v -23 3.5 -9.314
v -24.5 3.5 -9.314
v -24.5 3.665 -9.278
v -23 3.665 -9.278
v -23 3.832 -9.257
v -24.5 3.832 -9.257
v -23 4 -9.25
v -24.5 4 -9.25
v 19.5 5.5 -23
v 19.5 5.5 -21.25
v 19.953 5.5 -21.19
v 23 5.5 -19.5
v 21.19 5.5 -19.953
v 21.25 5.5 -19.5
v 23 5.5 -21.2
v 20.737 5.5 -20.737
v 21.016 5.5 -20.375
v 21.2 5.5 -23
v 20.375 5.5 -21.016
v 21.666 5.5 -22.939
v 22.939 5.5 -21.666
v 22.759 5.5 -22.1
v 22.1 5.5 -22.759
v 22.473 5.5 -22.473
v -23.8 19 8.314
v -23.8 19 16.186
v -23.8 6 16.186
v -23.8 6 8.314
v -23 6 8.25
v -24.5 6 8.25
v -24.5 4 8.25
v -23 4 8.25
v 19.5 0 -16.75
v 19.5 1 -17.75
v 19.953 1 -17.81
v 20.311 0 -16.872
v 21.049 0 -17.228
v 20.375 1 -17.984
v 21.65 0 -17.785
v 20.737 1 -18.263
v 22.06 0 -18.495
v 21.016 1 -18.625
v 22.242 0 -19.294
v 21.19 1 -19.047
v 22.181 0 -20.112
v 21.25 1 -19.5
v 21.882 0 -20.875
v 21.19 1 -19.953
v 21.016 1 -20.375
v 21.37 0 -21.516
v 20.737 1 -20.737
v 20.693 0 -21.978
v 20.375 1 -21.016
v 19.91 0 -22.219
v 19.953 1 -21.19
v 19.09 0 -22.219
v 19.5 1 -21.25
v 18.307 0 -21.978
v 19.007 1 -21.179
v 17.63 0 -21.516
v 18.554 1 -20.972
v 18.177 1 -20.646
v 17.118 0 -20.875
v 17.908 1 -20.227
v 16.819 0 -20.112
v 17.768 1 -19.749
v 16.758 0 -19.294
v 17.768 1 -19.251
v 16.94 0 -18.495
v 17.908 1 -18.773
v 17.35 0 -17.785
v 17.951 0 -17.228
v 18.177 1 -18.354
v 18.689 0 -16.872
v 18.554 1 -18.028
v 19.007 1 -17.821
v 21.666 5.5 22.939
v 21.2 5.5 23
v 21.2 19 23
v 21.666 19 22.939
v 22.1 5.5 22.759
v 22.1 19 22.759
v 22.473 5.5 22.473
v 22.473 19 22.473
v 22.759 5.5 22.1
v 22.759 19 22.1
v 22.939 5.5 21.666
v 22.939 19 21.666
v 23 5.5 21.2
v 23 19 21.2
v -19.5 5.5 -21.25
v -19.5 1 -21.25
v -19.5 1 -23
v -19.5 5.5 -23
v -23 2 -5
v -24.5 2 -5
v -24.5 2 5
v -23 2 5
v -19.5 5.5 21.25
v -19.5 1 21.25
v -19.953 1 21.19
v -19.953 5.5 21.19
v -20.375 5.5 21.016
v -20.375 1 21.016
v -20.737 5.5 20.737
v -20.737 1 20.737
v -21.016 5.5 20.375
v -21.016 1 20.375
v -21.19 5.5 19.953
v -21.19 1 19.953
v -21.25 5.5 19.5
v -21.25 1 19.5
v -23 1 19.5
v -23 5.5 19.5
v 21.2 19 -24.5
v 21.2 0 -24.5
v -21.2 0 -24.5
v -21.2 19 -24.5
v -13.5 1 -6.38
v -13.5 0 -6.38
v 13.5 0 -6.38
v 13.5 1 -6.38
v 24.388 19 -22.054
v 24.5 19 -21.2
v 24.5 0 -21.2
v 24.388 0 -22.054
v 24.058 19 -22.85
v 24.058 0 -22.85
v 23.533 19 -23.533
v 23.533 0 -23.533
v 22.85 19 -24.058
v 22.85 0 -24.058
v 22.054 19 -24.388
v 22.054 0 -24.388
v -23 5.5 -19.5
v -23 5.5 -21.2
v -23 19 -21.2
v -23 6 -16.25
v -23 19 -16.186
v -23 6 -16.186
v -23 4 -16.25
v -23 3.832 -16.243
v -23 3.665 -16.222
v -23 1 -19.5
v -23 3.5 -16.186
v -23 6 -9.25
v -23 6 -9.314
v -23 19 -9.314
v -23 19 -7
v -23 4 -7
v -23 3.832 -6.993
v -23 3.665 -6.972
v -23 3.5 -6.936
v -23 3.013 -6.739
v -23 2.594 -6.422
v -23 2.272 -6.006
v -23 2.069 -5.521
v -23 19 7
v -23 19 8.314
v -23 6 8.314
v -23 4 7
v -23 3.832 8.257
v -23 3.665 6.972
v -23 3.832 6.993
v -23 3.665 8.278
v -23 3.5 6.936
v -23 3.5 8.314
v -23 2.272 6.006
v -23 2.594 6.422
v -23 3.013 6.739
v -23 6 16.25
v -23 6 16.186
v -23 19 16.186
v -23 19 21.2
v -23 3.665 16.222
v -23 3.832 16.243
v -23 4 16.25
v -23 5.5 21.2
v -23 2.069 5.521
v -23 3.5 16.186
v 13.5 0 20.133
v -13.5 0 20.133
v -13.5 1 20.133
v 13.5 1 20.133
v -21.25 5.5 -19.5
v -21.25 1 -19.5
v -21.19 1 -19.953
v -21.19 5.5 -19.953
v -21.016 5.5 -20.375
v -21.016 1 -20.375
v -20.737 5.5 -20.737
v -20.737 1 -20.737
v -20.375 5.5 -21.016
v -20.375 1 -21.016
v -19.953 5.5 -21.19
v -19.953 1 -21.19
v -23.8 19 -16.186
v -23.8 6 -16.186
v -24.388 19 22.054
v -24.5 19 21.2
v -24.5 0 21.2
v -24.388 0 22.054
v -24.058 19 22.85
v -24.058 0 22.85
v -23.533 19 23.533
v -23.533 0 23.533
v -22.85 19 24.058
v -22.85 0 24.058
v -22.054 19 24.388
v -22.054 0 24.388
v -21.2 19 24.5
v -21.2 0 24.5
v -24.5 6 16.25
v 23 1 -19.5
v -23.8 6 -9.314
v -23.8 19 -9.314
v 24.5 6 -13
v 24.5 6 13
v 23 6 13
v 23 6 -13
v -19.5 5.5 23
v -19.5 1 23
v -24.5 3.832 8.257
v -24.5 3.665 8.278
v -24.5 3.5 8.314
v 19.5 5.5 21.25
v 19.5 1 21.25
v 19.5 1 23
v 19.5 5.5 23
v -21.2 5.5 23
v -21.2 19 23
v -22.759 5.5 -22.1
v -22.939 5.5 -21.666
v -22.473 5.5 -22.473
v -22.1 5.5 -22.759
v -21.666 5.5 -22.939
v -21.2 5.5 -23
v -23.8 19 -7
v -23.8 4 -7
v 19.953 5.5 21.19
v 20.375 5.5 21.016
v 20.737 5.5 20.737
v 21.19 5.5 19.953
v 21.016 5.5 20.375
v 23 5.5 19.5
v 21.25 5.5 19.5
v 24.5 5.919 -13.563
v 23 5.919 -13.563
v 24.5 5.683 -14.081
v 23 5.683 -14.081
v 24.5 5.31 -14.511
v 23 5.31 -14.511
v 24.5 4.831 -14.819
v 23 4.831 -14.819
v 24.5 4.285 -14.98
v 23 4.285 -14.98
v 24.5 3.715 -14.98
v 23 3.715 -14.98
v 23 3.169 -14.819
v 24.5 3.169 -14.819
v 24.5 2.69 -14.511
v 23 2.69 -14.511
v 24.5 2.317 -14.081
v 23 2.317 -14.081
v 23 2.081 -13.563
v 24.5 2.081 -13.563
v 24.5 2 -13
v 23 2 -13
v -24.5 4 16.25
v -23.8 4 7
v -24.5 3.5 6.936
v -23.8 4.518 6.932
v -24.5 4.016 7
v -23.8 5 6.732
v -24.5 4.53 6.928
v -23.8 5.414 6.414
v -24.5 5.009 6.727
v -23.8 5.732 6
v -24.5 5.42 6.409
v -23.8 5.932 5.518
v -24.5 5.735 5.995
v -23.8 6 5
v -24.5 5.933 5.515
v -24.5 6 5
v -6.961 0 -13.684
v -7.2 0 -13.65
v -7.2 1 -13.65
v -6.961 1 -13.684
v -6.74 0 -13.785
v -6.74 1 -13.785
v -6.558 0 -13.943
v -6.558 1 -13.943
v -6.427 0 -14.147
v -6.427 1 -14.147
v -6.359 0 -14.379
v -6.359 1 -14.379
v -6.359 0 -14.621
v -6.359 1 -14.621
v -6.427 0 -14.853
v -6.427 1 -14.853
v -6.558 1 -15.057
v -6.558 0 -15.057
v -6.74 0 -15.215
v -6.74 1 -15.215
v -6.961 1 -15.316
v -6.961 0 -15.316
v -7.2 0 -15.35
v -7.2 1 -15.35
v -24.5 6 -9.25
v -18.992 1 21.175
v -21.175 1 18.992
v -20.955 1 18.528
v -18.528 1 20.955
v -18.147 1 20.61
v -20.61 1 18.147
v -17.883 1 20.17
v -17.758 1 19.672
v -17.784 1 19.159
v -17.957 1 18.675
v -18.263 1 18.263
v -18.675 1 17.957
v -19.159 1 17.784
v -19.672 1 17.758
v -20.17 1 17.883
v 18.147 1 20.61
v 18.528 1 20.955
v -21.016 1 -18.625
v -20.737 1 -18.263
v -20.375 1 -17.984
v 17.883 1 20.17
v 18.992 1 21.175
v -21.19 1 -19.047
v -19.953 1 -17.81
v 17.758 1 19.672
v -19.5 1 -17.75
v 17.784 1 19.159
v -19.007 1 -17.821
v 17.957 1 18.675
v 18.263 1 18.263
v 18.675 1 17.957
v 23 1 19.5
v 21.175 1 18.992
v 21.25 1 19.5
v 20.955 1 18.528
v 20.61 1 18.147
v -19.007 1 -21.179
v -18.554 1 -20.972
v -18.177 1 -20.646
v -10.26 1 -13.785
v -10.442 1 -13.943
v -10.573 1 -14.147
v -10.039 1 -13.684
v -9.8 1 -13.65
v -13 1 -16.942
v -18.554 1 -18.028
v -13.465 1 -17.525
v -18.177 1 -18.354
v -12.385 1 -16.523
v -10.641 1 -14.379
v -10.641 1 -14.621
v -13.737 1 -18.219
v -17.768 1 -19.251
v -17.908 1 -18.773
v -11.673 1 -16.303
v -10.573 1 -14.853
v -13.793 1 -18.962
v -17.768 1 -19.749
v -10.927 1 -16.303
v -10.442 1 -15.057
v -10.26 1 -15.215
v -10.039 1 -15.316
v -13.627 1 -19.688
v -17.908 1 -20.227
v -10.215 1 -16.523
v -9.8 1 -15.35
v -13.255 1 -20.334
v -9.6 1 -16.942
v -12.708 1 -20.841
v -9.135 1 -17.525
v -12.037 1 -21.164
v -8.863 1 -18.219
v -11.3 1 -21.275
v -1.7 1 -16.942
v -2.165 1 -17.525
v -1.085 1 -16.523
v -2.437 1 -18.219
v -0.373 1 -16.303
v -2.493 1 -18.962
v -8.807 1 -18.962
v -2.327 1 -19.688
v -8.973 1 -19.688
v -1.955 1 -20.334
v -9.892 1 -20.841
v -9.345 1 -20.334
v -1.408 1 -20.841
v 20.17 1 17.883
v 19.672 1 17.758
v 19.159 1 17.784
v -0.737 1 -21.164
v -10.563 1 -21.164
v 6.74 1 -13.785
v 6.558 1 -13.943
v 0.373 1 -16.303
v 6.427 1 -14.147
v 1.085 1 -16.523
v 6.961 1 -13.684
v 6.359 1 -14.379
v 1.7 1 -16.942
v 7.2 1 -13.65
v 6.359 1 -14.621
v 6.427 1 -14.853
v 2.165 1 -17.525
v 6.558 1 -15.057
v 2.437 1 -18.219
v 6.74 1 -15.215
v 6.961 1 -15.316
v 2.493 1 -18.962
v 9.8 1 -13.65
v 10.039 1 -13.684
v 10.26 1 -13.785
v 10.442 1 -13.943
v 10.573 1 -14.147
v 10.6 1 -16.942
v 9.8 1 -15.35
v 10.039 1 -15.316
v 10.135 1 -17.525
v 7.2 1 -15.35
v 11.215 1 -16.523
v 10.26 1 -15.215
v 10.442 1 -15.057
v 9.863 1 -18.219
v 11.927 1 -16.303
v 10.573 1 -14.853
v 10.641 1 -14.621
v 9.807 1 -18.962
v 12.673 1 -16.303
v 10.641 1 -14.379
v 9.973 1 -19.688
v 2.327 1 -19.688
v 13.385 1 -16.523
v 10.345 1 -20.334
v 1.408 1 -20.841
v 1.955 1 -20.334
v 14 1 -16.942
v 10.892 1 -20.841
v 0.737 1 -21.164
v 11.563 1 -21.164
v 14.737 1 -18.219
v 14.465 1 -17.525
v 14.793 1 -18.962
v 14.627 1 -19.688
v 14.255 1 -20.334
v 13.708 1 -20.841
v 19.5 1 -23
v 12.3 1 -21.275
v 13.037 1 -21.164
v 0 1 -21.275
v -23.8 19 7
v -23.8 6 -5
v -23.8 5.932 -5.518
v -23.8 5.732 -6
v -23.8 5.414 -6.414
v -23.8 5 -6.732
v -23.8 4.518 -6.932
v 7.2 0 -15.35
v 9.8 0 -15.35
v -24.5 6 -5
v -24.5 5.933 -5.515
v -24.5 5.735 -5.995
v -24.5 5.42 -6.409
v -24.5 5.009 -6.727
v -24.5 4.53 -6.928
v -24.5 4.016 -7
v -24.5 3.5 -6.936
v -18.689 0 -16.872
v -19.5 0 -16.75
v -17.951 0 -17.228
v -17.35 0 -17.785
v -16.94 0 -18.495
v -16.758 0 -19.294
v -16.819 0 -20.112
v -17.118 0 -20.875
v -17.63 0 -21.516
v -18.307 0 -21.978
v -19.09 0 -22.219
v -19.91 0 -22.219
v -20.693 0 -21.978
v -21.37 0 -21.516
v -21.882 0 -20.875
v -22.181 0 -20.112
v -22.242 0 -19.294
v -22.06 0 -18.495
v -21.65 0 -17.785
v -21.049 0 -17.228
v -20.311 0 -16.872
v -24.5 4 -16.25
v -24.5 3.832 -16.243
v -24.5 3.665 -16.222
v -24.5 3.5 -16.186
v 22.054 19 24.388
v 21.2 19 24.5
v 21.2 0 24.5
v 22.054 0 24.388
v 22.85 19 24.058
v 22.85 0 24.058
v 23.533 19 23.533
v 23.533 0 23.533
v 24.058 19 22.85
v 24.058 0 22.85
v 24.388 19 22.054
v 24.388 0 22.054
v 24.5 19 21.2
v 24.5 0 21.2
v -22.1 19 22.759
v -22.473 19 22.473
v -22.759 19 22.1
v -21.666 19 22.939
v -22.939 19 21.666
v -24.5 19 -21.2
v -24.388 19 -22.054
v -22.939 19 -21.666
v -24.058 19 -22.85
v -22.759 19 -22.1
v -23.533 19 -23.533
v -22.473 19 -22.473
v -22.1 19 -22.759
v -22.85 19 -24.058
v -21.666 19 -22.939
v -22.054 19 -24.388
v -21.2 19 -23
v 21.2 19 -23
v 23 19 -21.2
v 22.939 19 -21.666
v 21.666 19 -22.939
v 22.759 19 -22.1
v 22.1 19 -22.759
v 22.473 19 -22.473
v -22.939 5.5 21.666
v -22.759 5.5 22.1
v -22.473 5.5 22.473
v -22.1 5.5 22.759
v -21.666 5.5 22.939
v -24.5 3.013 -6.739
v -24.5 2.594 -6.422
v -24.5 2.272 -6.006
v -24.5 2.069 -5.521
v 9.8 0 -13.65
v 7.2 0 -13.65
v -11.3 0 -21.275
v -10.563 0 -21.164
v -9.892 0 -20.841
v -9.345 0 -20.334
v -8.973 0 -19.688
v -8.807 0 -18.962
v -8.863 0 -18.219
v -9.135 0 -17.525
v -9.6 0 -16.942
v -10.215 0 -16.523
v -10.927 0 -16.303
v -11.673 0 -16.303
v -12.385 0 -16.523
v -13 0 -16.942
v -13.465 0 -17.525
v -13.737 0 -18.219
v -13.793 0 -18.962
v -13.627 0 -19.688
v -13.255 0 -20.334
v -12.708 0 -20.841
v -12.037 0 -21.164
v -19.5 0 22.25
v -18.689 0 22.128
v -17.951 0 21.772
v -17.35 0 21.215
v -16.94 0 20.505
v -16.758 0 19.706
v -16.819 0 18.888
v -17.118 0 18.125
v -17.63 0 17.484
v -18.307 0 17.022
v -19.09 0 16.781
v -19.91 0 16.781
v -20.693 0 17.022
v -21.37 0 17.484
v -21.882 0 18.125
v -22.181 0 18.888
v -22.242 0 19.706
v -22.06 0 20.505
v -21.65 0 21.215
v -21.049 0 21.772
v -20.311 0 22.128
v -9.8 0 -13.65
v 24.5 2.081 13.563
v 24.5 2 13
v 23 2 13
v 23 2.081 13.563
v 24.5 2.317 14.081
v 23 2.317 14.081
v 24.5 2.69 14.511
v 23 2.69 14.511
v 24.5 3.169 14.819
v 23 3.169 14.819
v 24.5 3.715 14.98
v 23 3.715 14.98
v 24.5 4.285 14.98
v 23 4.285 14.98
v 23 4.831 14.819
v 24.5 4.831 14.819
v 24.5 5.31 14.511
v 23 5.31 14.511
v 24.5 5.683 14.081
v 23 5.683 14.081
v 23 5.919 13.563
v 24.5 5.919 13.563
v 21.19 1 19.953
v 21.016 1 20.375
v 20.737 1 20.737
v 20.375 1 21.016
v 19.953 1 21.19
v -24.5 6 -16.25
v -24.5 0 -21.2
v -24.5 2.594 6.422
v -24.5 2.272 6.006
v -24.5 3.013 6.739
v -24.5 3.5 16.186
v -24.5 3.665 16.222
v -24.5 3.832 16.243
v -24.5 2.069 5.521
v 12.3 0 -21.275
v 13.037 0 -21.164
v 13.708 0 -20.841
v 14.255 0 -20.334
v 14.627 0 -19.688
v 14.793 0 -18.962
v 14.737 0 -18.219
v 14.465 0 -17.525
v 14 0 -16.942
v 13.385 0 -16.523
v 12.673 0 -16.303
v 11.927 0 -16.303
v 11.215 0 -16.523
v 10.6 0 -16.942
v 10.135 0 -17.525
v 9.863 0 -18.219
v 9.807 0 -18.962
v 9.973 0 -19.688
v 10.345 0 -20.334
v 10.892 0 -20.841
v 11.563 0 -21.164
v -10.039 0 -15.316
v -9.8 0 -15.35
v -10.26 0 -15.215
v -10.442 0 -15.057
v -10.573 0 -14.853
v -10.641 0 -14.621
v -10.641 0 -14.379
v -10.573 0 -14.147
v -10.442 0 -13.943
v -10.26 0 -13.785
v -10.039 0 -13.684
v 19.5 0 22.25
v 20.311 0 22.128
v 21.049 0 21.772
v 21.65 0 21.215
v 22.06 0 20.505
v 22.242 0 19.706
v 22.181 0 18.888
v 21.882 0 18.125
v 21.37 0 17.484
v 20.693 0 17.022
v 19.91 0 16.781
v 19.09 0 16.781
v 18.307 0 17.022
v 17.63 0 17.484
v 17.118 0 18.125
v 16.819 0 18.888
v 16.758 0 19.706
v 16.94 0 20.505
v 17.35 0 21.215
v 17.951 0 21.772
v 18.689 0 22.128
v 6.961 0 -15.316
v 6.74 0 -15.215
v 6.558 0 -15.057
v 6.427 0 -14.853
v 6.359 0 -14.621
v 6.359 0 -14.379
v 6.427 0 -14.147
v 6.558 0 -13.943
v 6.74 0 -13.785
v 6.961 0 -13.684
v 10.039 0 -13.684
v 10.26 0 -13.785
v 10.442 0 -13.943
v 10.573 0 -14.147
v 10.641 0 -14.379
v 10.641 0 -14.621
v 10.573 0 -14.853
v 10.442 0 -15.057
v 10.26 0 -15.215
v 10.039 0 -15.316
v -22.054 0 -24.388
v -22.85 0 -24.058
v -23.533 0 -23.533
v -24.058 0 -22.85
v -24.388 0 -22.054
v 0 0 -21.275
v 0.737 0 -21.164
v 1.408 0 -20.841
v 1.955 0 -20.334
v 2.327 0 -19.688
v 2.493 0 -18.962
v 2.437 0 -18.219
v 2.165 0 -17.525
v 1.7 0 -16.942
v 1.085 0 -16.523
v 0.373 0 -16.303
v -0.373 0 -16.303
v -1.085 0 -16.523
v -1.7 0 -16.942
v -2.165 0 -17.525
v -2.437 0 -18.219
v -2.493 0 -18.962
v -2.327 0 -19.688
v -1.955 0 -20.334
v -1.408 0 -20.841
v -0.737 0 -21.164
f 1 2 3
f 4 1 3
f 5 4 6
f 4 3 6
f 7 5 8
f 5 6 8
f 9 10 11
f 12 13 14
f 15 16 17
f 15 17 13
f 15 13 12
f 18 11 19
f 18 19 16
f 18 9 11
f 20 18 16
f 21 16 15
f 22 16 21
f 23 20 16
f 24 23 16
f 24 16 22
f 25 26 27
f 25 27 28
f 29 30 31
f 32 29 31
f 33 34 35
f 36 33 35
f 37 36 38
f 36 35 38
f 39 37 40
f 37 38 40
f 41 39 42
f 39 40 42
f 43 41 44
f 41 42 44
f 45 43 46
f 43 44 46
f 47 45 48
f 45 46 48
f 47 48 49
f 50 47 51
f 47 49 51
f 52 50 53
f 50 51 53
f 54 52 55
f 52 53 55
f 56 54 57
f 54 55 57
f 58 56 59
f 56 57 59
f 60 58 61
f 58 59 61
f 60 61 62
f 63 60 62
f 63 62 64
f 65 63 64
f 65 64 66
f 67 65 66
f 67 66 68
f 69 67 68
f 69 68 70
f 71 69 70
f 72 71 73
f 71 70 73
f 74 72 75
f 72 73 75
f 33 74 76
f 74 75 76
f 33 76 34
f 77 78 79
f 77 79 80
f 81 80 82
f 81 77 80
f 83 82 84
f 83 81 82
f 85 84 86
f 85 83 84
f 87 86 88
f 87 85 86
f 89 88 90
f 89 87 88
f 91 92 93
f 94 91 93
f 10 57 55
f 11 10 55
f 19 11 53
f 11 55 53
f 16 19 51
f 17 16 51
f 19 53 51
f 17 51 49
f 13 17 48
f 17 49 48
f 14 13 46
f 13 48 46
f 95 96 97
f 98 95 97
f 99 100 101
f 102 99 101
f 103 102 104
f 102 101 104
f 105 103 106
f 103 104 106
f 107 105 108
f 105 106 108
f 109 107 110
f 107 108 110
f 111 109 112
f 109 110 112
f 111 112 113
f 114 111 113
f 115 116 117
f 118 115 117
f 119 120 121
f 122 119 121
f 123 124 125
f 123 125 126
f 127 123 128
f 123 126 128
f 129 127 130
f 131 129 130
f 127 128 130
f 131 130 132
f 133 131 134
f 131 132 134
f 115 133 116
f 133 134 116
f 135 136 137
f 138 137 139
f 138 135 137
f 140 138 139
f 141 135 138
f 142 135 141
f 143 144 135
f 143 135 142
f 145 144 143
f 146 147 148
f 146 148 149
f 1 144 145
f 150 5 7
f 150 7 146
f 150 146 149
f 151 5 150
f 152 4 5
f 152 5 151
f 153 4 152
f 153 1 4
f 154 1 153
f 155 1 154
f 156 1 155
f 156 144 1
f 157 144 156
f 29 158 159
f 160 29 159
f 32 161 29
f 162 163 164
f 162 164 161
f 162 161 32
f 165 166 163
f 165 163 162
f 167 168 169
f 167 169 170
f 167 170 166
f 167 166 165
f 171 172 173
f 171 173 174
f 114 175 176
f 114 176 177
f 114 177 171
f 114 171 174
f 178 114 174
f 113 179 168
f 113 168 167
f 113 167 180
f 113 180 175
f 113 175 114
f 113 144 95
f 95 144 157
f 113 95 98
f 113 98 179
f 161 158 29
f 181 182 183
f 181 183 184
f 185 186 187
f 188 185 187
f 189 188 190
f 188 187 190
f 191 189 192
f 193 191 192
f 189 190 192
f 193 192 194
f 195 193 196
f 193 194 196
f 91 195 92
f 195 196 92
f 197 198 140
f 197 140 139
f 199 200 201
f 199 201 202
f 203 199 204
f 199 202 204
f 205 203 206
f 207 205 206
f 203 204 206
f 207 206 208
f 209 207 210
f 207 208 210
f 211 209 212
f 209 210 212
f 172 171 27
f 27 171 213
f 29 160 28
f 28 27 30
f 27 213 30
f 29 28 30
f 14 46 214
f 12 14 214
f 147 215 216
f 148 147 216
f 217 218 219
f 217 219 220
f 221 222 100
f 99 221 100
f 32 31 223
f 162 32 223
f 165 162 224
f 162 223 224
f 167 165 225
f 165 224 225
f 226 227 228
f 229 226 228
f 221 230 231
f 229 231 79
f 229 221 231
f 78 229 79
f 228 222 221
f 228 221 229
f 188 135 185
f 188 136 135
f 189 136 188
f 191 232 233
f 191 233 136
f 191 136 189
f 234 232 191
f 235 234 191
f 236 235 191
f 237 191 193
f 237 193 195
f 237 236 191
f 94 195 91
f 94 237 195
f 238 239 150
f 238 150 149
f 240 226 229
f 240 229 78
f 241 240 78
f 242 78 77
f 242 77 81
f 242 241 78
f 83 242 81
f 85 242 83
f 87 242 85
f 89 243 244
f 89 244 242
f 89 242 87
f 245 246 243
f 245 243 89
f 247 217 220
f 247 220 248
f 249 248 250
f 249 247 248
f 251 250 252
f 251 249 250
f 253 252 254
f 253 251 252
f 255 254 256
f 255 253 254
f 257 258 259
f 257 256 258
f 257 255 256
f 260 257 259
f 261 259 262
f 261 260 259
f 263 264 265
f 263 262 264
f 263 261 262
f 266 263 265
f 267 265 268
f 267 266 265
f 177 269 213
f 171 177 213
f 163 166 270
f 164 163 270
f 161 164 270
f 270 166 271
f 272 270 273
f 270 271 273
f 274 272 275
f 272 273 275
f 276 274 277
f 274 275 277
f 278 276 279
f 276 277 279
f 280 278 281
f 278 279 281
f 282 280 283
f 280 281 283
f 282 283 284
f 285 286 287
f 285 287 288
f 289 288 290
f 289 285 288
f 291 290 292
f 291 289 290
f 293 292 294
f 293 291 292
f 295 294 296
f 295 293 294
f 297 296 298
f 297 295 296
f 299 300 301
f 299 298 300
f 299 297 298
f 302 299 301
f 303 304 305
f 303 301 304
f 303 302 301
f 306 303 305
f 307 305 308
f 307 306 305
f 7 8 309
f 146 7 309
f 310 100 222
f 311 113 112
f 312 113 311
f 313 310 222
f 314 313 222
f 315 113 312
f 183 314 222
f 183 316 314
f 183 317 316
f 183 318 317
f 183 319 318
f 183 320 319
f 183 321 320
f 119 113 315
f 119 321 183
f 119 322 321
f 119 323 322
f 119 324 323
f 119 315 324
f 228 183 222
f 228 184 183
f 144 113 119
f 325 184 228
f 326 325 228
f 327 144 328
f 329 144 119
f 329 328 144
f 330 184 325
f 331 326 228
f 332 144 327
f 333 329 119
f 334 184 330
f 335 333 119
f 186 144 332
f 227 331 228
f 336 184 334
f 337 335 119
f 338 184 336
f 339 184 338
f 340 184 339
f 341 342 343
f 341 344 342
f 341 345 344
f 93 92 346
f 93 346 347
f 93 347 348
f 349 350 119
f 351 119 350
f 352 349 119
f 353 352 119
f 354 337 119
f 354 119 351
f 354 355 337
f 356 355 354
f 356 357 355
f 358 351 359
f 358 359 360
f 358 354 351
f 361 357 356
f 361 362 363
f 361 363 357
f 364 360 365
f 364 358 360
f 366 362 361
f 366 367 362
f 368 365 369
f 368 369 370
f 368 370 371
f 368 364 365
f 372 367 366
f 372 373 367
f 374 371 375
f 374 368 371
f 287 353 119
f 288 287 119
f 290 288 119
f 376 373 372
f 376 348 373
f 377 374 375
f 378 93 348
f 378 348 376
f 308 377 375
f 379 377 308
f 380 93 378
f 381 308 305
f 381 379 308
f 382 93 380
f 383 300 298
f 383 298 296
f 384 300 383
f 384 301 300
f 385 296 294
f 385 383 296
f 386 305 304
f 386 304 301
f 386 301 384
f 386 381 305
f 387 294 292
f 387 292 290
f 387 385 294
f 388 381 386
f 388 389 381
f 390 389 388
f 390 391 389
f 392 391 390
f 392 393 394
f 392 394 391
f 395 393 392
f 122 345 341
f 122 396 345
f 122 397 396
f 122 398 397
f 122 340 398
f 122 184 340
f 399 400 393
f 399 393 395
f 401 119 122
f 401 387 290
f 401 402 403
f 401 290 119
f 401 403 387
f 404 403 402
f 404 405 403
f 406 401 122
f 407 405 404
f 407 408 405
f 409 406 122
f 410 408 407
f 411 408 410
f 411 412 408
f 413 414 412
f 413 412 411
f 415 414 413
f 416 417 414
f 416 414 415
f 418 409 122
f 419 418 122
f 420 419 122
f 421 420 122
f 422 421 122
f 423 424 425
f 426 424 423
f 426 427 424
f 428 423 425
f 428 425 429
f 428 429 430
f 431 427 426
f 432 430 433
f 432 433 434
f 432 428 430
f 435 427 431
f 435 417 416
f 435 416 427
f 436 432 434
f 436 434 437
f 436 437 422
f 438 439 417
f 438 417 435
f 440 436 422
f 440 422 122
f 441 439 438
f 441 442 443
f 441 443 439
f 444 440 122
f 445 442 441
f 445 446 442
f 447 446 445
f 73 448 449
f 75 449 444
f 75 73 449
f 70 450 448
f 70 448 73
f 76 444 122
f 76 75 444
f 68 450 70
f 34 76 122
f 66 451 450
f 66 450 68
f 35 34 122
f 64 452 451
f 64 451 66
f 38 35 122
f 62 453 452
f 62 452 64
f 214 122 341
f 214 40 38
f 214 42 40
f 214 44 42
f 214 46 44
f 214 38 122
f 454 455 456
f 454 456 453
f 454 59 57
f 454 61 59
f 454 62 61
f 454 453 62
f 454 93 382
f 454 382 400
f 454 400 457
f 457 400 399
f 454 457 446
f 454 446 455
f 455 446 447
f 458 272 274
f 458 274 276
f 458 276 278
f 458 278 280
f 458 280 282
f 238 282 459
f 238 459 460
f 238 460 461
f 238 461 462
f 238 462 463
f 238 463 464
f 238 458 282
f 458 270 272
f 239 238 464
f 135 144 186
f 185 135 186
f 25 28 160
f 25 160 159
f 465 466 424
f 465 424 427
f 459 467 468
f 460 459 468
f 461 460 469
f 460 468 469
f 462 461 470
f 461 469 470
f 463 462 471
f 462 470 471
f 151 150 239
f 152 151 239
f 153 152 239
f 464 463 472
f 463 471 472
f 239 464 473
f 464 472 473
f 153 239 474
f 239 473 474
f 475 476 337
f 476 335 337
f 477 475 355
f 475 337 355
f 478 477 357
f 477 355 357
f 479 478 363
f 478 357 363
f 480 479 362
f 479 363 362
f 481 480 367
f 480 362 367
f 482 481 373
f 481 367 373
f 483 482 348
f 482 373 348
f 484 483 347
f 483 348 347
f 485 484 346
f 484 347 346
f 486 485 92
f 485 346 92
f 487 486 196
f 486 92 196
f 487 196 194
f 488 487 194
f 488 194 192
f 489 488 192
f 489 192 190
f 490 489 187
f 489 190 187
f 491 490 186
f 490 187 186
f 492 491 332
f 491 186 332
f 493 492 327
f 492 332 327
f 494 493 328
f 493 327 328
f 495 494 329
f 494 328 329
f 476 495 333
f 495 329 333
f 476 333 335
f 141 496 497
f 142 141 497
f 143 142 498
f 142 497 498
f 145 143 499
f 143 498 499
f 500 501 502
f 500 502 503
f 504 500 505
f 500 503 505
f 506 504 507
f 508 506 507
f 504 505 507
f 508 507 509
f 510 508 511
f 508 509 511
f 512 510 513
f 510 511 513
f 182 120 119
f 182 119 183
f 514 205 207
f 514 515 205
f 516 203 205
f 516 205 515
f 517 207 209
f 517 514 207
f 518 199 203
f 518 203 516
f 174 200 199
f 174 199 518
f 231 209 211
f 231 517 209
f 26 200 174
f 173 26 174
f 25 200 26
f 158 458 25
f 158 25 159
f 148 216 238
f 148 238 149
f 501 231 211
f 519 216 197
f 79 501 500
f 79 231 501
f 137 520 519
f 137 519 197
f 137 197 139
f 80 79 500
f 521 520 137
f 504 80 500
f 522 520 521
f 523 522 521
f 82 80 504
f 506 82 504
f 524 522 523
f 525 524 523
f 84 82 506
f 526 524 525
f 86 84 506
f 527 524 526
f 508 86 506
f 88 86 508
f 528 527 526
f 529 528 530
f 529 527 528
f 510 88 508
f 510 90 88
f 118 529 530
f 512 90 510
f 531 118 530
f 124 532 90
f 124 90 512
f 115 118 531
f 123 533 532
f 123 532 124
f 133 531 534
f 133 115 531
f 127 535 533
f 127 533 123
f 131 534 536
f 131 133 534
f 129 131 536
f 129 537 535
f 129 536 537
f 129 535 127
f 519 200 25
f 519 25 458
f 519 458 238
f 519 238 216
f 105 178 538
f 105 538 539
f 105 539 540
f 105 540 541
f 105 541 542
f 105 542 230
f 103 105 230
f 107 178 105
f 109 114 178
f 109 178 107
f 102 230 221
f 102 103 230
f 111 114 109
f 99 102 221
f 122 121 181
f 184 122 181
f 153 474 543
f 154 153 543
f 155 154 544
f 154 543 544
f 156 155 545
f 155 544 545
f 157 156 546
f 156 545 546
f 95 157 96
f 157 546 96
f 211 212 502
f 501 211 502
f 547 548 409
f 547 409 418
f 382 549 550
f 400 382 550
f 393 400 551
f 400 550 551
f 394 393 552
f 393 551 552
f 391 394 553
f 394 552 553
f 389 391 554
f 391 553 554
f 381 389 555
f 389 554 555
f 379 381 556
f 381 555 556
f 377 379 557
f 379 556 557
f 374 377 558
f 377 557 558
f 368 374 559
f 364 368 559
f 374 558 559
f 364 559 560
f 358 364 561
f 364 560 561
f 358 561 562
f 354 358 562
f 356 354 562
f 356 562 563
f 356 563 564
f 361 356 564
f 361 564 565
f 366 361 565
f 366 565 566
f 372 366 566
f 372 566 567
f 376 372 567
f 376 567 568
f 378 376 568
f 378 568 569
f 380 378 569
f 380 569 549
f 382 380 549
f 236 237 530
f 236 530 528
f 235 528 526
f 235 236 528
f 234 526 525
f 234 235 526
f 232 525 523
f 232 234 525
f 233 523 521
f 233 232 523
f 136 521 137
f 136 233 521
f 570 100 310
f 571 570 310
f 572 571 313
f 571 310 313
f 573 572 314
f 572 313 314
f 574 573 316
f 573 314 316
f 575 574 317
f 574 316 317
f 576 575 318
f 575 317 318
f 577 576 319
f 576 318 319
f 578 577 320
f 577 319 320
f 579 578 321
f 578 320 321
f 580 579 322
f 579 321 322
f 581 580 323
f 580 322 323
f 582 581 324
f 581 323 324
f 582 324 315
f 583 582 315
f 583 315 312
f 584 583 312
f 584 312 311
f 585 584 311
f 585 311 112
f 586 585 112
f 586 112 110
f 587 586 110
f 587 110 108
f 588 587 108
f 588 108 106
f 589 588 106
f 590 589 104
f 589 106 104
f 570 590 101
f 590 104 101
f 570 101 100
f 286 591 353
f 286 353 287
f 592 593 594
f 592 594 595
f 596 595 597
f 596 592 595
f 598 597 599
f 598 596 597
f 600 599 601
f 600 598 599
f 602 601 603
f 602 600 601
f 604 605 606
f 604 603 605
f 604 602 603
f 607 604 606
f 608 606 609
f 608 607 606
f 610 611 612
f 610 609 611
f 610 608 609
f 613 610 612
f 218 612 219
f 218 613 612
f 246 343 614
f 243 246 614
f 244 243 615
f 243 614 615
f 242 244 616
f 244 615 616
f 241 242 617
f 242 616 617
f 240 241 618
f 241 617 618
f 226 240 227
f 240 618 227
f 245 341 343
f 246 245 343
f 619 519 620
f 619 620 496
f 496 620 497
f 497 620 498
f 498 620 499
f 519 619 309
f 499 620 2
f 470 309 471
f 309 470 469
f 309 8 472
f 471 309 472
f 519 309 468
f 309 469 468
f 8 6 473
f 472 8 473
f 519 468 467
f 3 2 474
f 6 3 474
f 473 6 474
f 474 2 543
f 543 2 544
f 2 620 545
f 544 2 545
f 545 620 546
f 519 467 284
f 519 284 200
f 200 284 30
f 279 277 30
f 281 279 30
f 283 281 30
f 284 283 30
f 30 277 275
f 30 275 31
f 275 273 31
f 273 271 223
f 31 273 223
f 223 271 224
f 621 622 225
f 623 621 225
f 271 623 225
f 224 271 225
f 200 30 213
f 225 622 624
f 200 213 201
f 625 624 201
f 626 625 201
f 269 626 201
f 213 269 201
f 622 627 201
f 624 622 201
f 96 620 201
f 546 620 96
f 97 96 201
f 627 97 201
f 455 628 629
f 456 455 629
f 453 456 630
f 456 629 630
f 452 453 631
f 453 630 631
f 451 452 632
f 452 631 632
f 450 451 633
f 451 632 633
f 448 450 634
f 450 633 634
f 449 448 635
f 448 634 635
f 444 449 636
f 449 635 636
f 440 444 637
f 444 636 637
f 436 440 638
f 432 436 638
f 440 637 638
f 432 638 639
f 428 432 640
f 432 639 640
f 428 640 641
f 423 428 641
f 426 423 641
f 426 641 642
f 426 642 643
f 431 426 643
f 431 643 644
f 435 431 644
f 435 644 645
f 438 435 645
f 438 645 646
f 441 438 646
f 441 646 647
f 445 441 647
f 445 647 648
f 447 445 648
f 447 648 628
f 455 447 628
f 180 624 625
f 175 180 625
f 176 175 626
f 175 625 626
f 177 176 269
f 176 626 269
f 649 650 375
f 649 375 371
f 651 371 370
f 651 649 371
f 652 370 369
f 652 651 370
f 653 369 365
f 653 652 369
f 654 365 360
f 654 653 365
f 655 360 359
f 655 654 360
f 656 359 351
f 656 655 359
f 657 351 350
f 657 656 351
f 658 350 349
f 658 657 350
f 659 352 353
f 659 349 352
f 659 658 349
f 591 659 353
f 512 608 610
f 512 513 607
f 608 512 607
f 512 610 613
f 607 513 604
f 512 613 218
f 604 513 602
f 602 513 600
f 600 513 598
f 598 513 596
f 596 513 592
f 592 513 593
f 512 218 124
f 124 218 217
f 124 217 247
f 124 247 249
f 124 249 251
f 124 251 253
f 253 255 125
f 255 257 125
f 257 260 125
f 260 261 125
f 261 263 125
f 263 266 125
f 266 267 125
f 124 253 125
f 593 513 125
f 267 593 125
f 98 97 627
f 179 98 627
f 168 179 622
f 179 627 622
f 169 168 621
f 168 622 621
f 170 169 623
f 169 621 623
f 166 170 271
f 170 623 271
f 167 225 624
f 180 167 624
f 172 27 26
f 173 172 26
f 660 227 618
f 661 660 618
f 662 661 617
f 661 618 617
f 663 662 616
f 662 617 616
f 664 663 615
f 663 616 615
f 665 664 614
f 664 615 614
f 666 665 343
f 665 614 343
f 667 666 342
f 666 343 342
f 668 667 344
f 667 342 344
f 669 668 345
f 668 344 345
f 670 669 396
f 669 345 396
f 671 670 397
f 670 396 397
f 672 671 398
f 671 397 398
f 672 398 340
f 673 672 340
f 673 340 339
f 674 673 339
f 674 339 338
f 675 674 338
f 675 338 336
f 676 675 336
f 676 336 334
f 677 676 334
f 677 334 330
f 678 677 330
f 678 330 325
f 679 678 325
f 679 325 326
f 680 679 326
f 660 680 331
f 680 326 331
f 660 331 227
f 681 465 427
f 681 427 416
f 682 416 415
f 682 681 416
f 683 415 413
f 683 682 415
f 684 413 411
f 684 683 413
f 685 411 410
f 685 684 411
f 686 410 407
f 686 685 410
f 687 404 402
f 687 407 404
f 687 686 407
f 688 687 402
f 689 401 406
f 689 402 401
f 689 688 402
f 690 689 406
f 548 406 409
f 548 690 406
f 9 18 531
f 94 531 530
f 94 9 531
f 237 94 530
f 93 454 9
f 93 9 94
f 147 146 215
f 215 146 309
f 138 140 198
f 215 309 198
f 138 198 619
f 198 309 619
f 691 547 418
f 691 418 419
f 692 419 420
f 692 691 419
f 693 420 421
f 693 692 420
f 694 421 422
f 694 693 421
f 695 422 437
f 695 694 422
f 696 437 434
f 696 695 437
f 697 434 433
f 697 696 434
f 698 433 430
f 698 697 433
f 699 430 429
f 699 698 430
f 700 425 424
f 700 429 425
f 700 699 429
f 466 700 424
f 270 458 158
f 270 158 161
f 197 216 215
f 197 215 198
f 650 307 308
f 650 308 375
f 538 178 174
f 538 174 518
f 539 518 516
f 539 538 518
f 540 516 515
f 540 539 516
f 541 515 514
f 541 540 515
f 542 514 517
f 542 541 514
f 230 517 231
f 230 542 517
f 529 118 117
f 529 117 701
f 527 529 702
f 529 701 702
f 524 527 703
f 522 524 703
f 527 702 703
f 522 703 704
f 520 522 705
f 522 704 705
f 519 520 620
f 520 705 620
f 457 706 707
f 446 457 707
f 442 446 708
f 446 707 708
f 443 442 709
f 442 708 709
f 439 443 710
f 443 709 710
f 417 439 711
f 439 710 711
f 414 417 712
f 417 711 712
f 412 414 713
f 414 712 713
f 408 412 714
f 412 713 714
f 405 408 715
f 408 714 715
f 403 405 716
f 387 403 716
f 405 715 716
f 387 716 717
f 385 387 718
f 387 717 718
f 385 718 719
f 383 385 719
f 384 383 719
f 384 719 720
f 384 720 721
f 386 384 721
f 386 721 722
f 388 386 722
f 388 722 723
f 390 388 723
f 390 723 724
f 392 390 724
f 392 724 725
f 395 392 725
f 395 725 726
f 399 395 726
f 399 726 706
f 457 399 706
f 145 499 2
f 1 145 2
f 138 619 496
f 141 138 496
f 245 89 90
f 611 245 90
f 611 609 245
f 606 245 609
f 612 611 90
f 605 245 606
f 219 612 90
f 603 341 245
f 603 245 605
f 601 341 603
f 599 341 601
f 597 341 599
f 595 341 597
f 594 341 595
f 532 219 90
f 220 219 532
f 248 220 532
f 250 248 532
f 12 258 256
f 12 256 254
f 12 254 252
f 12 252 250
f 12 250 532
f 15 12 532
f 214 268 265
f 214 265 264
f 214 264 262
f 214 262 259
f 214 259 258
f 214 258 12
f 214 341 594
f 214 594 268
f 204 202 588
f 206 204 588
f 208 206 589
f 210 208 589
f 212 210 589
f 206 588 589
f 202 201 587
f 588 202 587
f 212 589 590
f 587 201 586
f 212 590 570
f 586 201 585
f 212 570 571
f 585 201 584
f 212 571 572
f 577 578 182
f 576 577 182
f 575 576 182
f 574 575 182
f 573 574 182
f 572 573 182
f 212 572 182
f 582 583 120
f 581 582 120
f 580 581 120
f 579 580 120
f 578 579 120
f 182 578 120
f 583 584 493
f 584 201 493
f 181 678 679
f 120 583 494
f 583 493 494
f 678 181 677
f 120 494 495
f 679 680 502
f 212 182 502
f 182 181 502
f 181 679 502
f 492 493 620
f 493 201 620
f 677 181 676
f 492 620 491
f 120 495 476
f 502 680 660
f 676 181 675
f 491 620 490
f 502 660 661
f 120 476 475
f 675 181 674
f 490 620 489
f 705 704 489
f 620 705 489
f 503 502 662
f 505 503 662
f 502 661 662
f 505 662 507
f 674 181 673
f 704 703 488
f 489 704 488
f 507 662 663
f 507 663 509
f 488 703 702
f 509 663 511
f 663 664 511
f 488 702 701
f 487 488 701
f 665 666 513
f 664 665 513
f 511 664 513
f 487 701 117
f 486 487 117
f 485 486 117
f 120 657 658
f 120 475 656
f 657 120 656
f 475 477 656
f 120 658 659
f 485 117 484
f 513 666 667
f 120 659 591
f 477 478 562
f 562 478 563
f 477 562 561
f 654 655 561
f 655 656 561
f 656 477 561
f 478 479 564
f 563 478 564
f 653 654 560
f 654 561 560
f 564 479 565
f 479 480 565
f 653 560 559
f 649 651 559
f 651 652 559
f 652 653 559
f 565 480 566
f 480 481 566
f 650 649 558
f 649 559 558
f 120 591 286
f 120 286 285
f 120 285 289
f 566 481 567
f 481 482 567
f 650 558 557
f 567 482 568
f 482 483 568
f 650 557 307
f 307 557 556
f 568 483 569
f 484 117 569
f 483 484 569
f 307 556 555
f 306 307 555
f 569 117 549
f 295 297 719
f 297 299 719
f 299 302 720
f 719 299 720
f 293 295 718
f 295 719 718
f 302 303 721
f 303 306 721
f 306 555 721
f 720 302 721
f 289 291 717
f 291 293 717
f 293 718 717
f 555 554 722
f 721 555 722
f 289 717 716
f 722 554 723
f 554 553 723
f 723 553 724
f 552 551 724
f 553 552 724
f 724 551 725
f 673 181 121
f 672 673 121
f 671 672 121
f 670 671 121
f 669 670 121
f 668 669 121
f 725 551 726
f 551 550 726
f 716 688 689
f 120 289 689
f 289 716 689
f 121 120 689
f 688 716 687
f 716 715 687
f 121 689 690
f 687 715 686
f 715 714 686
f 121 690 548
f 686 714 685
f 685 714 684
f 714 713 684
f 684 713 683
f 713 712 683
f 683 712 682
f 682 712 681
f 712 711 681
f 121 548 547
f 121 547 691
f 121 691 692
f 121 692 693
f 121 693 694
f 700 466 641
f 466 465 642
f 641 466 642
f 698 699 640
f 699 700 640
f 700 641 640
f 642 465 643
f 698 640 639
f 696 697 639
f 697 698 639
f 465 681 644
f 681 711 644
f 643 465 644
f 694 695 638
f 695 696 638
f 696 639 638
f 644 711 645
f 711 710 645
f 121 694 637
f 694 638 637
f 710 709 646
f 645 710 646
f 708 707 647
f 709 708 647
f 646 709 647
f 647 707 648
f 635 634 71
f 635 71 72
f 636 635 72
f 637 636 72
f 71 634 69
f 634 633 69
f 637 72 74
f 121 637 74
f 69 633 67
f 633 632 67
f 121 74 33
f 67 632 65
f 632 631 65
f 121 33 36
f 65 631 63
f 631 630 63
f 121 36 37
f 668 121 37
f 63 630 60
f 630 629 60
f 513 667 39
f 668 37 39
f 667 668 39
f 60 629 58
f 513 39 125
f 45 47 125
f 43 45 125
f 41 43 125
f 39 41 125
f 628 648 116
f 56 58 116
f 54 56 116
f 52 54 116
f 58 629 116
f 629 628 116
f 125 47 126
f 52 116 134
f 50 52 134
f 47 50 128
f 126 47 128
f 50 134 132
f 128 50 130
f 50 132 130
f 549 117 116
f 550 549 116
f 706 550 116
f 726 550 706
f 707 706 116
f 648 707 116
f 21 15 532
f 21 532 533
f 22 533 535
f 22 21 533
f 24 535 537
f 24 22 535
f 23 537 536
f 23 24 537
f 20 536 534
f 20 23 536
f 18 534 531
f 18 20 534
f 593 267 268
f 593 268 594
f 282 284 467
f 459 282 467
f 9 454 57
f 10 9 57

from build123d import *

# Parameters (mm, degrees)
EXTRUDE_1_DEPTH                = 19
SKETCH_1_3_R                   = 1.75
EXTRUDE_1_2_DEPTH              = 1
HOLE_WIZARD_M2_5_1_D           = 3.1
HOLE_WIZARD_M2_5_1_DEPTH       = 10
HOLE_WIZARD_M2_5_1_CSINK_D     = 5.5
HOLE_WIZARD_M2_5_1_CSINK_ANGLE = 90
HOLE_WIZARD_M2_5_1_TIP         = 0.931333959
SKETCH_4_R                     = 2.5
SKETCH_4_R_2                   = 1.75
SKETCH_4_W                     = 27
SKETCH_4_H                     = 26.512923835
CUT_EXTRUDE_1_DEPTH            = 143
CUT_EXTRUDE_2_DEPTH            = 21
CUT_EXTRUDE_4_DEPTH            = 27
EXTRUDE_2_DEPTH                = 4.5
CUT_EXTRUDE_START              = -0.8
SKETCH_9_W                     = 7.872983346
SKETCH_9_H                     = 13
SKETCH_9_W_2                   = 6.872983346
CUT_EXTRUDE_5_DEPTH            = 0.8


with BuildPart() as part:
    # 草图1 → Extrude 1 (new body)
    with BuildSketch(Plane(origin=(0, 0, 0), x_dir=(1, 0, 0), z_dir=(0, 1, 0))):
        with BuildLine():
            Line((-24.5, 21.2), (-24.5, -21.2))
            ThreePointArc((-24.5, -21.2), (-23.533452378, -23.533452378), (-21.2, -24.5))
            Line((-21.2, -24.5), (21.2, -24.5))
            ThreePointArc((21.2, -24.5), (23.533452378, -23.533452378), (24.5, -21.2))
            Line((24.5, -21.2), (24.5, 21.2))
            ThreePointArc((24.5, 21.2), (23.533452378, 23.533452378), (21.2, 24.5))
            Line((21.2, 24.5), (-21.2, 24.5))
            ThreePointArc((-21.2, 24.5), (-23.533452378, 23.533452378), (-24.5, 21.2))
        make_face()
        with BuildLine():
            Line((-23, 21.2), (-23, -21.2))
            ThreePointArc((-23, -21.2), (-22.472792206, -22.472792206), (-21.2, -23))
            Line((-21.2, -23), (21.2, -23))
            ThreePointArc((21.2, -23), (22.472792206, -22.472792206), (23, -21.2))
            Line((23, -21.2), (23, 21.2))
            ThreePointArc((23, 21.2), (22.472792206, 22.472792206), (21.2, 23))
            Line((21.2, 23), (-21.2, 23))
            ThreePointArc((-21.2, 23), (-22.472792206, 22.472792206), (-23, 21.2))
        make_face(mode=Mode.SUBTRACT)
    extrude(amount=EXTRUDE_1_DEPTH)

    # 草图1<3> → Extrude 1 2 (add)
    with BuildSketch(Plane(origin=(0, 0, 0), x_dir=(1, 0, 0), z_dir=(0, 1, 0))):
        with BuildLine():
            Line((-21.2, -23), (21.2, -23))
            ThreePointArc((21.2, -23), (22.472792206, -22.472792206), (23, -21.2))
            Line((23, -21.2), (23, 21.2))
            ThreePointArc((23, 21.2), (22.472792206, 22.472792206), (21.2, 23))
            Line((21.2, 23), (-21.2, 23))
            ThreePointArc((-21.2, 23), (-22.472792206, 22.472792206), (-23, 21.2))
            Line((-23, 21.2), (-23, -21.2))
            ThreePointArc((-23, -21.2), (-22.472792206, -22.472792206), (-21.2, -23))
        make_face()
        with Locations(Location((-19.5, 19.5, 0), (0, 0, 270))):
            Circle(SKETCH_1_3_R, mode=Mode.SUBTRACT)
        with Locations(Location((19.5, 19.5, 0), (0, 0, 270))):
            Circle(SKETCH_1_3_R, mode=Mode.SUBTRACT)
        with Locations(Location((19.5, -19.5, 0), (0, 0, 270))):
            Circle(SKETCH_1_3_R, mode=Mode.SUBTRACT)
        with Locations(Location((-19.5, -19.5, 0), (0, 0, 270))):
            Circle(SKETCH_1_3_R, mode=Mode.SUBTRACT)
    extrude(amount=EXTRUDE_1_2_DEPTH)

    # M2.5 平头机械螺钉的锥形沉头孔1
    with Locations(Plane(origin=(-19.5, 0, 19.5), x_dir=(0, 0, -1), z_dir=(0, -1, 0))):
        with Locations((0, 0), (0, 39), (39, 39), (39, 0)):
            CounterSinkHole(HOLE_WIZARD_M2_5_1_D / 2, HOLE_WIZARD_M2_5_1_CSINK_D / 2, depth=HOLE_WIZARD_M2_5_1_DEPTH, counter_sink_angle=HOLE_WIZARD_M2_5_1_CSINK_ANGLE)
            with Locations((0, 0, -(HOLE_WIZARD_M2_5_1_DEPTH + HOLE_WIZARD_M2_5_1_TIP / 2))):  # 118° drill point
                Cone(0, HOLE_WIZARD_M2_5_1_D / 2, HOLE_WIZARD_M2_5_1_TIP, mode=Mode.SUBTRACT)

    # 草图4 → 切除-拉伸1 (cut)
    with BuildSketch(Plane.XZ):
        with Locations(Location((-11.3, -18.775, 0), (0, 0, 270))):
            Circle(SKETCH_4_R)
        with Locations(Location((0, -18.775, 0), (0, 0, 270))):
            Circle(SKETCH_4_R)
        with Locations(Location((12.3, -18.775, 0), (0, 0, 270))):
            Circle(SKETCH_4_R)
        with Locations((-19.5, -19.5)):
            Circle(SKETCH_4_R_2)
        with Locations((0, 6.876225995)):
            Rectangle(SKETCH_4_W, SKETCH_4_H)
        with BuildLine():
            Line((7.2, -13.65), (9.8, -13.65))
            ThreePointArc((9.8, -13.65), (10.65, -14.5), (9.8, -15.35))
            Line((9.8, -15.35), (7.2, -15.35))
            ThreePointArc((7.2, -15.35), (6.35, -14.5), (7.2, -13.65))
        make_face()
        with BuildLine():
            Line((-9.8, -13.65), (-7.2, -13.65))
            ThreePointArc((-7.2, -13.65), (-6.35, -14.5), (-7.2, -15.35))
            Line((-7.2, -15.35), (-9.8, -15.35))
            ThreePointArc((-9.8, -15.35), (-10.65, -14.5), (-9.8, -13.65))
        make_face()
    extrude(amount=-CUT_EXTRUDE_1_DEPTH, mode=Mode.SUBTRACT)

    # 草图5 → 切除-拉伸2 (cut)
    with BuildSketch(Plane.ZY.offset(24.5)):
        with BuildLine():
            Line((-16.186491673, 3.5), (-9.313508327, 3.5))
            ThreePointArc((-9.313508327, 3.5), (-9.265940607, 3.747991415), (-9.25, 4))
            ThreePointArc((-9.25, 4), (-9.835786438, 5.414213562), (-11.25, 6))
            Line((-11.25, 6), (-14.25, 6))
            ThreePointArc((-14.25, 6), (-15.664213562, 5.414213562), (-16.25, 4))
            ThreePointArc((-16.25, 4), (-16.234059393, 3.747991415), (-16.186491673, 3.5))
        make_face()
        with BuildLine():
            Line((-6.936491673, 3.5), (6.936491673, 3.5))
            ThreePointArc((6.936491673, 3.5), (6.58113883, 5.224744871), (5, 6))
            Line((5, 6), (-5, 6))
            ThreePointArc((-5, 6), (-6.58113883, 5.224744871), (-6.936491673, 3.5))
        make_face()
        with BuildLine():
            Line((-5, 2), (5, 2))
            ThreePointArc((5, 2), (6.224744871, 2.41886117), (6.936491673, 3.5))
            Line((6.936491673, 3.5), (-6.936491673, 3.5))
            ThreePointArc((-6.936491673, 3.5), (-6.224744871, 2.41886117), (-5, 2))
        make_face()
        with BuildLine():
            Line((8.313508327, 3.5), (16.186491673, 3.5))
            ThreePointArc((16.186491673, 3.5), (16.234059393, 3.747991415), (16.25, 4))
            ThreePointArc((16.25, 4), (15.664213562, 5.414213562), (14.25, 6))
            Line((14.25, 6), (10.25, 6))
            ThreePointArc((10.25, 6), (8.835786438, 5.414213562), (8.25, 4))
            ThreePointArc((8.25, 4), (8.265940607, 3.747991415), (8.313508327, 3.5))
        make_face()
        with BuildLine():
            Line((-16.25, 6), (-16.25, 4))
            ThreePointArc((-16.25, 4), (-15.664213562, 5.414213562), (-14.25, 6))
            Line((-14.25, 6), (-16.25, 6))
        make_face()
        with BuildLine():
            ThreePointArc((14.25, 6), (15.664213562, 5.414213562), (16.25, 4))
            Line((16.25, 4), (16.25, 6))
            Line((16.25, 6), (14.25, 6))
        make_face()
        with BuildLine():
            ThreePointArc((-11.25, 6), (-9.835786438, 5.414213562), (-9.25, 4))
            Line((-9.25, 4), (-9.25, 6))
            Line((-9.25, 6), (-11.25, 6))
        make_face()
        with BuildLine():
            Line((8.25, 6), (8.25, 4))
            ThreePointArc((8.25, 4), (8.835786438, 5.414213562), (10.25, 6))
            Line((10.25, 6), (8.25, 6))
        make_face()
    extrude(amount=-CUT_EXTRUDE_2_DEPTH, mode=Mode.SUBTRACT)

    # 草图7 → 切除-拉伸4 (cut)
    with BuildSketch(Plane(origin=(24.5, 0, 0), x_dir=(0, 0, -1), z_dir=(1, 0, 0))):
        with BuildLine():
            Line((-13, 6), (13, 6))
            ThreePointArc((13, 6), (15, 4), (13, 2))
            Line((13, 2), (-13, 2))
            ThreePointArc((-13, 2), (-15, 4), (-13, 6))
        make_face()
    extrude(amount=-CUT_EXTRUDE_4_DEPTH, mode=Mode.SUBTRACT)

    # 草图8 → 凸台-拉伸2 (add)
    with BuildSketch(Plane(origin=(0, 1, 0), x_dir=(1, 0, 0), z_dir=(0, 1, 0))):
        with BuildLine():
            Line((-23, 19.5), (-21.25, 19.5))
            ThreePointArc((-21.25, 19.5), (-20.737436867, 20.737436867), (-19.5, 21.25))
            Line((-19.5, 21.25), (-19.5, 23))
            Line((-19.5, 23), (-21.2, 23))
            ThreePointArc((-21.2, 23), (-22.472792206, 22.472792206), (-23, 21.2))
            Line((-23, 21.2), (-23, 19.5))
        make_face()
        with BuildLine():
            Line((-21.25, -19.5), (-23, -19.5))
            Line((-23, -19.5), (-23, -21.2))
            ThreePointArc((-23, -21.2), (-22.472792206, -22.472792206), (-21.2, -23))
            Line((-21.2, -23), (-19.5, -23))
            Line((-19.5, -23), (-19.5, -21.25))
            ThreePointArc((-19.5, -21.25), (-20.737436867, -20.737436867), (-21.25, -19.5))
        make_face()
        with BuildLine():
            Line((19.5, -21.25), (19.5, -23))
            Line((19.5, -23), (21.2, -23))
            ThreePointArc((21.2, -23), (22.472792206, -22.472792206), (23, -21.2))
            Line((23, -21.2), (23, -19.5))
            Line((23, -19.5), (21.25, -19.5))
            ThreePointArc((21.25, -19.5), (20.737436867, -20.737436867), (19.5, -21.25))
        make_face()
        with BuildLine():
            Line((21.2, 23), (19.5, 23))
            Line((19.5, 23), (19.5, 21.25))
            ThreePointArc((19.5, 21.25), (20.737436867, 20.737436867), (21.25, 19.5))
            Line((21.25, 19.5), (23, 19.5))
            Line((23, 19.5), (23, 21.2))
            ThreePointArc((23, 21.2), (22.472792206, 22.472792206), (21.2, 23))
        make_face()
    extrude(amount=EXTRUDE_2_DEPTH)

    # 草图9 → 切除-拉伸5 (cut)
    with BuildSketch(Plane(origin=(-23, 0, 0), x_dir=(0, 0, -1), z_dir=(1, 0, 0)).offset(CUT_EXTRUDE_START)):
        with BuildLine():
            Line((-7, 19), (-7, 4))
            ThreePointArc((-7, 4), (-6.414213562, 5.414213562), (-5, 6))
            Line((-5, 6), (5, 6))
            ThreePointArc((5, 6), (6.414213562, 5.414213562), (7, 4))
            Line((7, 4), (7, 19))
            Line((7, 19), (-7, 19))
        make_face()
        with Locations((-12.25, 12.5)):
            Rectangle(SKETCH_9_W, SKETCH_9_H)
        with Locations((12.75, 12.5)):
            Rectangle(SKETCH_9_W_2, SKETCH_9_H)
    extrude(amount=CUT_EXTRUDE_5_DEPTH, mode=Mode.SUBTRACT)


solid = part.part
